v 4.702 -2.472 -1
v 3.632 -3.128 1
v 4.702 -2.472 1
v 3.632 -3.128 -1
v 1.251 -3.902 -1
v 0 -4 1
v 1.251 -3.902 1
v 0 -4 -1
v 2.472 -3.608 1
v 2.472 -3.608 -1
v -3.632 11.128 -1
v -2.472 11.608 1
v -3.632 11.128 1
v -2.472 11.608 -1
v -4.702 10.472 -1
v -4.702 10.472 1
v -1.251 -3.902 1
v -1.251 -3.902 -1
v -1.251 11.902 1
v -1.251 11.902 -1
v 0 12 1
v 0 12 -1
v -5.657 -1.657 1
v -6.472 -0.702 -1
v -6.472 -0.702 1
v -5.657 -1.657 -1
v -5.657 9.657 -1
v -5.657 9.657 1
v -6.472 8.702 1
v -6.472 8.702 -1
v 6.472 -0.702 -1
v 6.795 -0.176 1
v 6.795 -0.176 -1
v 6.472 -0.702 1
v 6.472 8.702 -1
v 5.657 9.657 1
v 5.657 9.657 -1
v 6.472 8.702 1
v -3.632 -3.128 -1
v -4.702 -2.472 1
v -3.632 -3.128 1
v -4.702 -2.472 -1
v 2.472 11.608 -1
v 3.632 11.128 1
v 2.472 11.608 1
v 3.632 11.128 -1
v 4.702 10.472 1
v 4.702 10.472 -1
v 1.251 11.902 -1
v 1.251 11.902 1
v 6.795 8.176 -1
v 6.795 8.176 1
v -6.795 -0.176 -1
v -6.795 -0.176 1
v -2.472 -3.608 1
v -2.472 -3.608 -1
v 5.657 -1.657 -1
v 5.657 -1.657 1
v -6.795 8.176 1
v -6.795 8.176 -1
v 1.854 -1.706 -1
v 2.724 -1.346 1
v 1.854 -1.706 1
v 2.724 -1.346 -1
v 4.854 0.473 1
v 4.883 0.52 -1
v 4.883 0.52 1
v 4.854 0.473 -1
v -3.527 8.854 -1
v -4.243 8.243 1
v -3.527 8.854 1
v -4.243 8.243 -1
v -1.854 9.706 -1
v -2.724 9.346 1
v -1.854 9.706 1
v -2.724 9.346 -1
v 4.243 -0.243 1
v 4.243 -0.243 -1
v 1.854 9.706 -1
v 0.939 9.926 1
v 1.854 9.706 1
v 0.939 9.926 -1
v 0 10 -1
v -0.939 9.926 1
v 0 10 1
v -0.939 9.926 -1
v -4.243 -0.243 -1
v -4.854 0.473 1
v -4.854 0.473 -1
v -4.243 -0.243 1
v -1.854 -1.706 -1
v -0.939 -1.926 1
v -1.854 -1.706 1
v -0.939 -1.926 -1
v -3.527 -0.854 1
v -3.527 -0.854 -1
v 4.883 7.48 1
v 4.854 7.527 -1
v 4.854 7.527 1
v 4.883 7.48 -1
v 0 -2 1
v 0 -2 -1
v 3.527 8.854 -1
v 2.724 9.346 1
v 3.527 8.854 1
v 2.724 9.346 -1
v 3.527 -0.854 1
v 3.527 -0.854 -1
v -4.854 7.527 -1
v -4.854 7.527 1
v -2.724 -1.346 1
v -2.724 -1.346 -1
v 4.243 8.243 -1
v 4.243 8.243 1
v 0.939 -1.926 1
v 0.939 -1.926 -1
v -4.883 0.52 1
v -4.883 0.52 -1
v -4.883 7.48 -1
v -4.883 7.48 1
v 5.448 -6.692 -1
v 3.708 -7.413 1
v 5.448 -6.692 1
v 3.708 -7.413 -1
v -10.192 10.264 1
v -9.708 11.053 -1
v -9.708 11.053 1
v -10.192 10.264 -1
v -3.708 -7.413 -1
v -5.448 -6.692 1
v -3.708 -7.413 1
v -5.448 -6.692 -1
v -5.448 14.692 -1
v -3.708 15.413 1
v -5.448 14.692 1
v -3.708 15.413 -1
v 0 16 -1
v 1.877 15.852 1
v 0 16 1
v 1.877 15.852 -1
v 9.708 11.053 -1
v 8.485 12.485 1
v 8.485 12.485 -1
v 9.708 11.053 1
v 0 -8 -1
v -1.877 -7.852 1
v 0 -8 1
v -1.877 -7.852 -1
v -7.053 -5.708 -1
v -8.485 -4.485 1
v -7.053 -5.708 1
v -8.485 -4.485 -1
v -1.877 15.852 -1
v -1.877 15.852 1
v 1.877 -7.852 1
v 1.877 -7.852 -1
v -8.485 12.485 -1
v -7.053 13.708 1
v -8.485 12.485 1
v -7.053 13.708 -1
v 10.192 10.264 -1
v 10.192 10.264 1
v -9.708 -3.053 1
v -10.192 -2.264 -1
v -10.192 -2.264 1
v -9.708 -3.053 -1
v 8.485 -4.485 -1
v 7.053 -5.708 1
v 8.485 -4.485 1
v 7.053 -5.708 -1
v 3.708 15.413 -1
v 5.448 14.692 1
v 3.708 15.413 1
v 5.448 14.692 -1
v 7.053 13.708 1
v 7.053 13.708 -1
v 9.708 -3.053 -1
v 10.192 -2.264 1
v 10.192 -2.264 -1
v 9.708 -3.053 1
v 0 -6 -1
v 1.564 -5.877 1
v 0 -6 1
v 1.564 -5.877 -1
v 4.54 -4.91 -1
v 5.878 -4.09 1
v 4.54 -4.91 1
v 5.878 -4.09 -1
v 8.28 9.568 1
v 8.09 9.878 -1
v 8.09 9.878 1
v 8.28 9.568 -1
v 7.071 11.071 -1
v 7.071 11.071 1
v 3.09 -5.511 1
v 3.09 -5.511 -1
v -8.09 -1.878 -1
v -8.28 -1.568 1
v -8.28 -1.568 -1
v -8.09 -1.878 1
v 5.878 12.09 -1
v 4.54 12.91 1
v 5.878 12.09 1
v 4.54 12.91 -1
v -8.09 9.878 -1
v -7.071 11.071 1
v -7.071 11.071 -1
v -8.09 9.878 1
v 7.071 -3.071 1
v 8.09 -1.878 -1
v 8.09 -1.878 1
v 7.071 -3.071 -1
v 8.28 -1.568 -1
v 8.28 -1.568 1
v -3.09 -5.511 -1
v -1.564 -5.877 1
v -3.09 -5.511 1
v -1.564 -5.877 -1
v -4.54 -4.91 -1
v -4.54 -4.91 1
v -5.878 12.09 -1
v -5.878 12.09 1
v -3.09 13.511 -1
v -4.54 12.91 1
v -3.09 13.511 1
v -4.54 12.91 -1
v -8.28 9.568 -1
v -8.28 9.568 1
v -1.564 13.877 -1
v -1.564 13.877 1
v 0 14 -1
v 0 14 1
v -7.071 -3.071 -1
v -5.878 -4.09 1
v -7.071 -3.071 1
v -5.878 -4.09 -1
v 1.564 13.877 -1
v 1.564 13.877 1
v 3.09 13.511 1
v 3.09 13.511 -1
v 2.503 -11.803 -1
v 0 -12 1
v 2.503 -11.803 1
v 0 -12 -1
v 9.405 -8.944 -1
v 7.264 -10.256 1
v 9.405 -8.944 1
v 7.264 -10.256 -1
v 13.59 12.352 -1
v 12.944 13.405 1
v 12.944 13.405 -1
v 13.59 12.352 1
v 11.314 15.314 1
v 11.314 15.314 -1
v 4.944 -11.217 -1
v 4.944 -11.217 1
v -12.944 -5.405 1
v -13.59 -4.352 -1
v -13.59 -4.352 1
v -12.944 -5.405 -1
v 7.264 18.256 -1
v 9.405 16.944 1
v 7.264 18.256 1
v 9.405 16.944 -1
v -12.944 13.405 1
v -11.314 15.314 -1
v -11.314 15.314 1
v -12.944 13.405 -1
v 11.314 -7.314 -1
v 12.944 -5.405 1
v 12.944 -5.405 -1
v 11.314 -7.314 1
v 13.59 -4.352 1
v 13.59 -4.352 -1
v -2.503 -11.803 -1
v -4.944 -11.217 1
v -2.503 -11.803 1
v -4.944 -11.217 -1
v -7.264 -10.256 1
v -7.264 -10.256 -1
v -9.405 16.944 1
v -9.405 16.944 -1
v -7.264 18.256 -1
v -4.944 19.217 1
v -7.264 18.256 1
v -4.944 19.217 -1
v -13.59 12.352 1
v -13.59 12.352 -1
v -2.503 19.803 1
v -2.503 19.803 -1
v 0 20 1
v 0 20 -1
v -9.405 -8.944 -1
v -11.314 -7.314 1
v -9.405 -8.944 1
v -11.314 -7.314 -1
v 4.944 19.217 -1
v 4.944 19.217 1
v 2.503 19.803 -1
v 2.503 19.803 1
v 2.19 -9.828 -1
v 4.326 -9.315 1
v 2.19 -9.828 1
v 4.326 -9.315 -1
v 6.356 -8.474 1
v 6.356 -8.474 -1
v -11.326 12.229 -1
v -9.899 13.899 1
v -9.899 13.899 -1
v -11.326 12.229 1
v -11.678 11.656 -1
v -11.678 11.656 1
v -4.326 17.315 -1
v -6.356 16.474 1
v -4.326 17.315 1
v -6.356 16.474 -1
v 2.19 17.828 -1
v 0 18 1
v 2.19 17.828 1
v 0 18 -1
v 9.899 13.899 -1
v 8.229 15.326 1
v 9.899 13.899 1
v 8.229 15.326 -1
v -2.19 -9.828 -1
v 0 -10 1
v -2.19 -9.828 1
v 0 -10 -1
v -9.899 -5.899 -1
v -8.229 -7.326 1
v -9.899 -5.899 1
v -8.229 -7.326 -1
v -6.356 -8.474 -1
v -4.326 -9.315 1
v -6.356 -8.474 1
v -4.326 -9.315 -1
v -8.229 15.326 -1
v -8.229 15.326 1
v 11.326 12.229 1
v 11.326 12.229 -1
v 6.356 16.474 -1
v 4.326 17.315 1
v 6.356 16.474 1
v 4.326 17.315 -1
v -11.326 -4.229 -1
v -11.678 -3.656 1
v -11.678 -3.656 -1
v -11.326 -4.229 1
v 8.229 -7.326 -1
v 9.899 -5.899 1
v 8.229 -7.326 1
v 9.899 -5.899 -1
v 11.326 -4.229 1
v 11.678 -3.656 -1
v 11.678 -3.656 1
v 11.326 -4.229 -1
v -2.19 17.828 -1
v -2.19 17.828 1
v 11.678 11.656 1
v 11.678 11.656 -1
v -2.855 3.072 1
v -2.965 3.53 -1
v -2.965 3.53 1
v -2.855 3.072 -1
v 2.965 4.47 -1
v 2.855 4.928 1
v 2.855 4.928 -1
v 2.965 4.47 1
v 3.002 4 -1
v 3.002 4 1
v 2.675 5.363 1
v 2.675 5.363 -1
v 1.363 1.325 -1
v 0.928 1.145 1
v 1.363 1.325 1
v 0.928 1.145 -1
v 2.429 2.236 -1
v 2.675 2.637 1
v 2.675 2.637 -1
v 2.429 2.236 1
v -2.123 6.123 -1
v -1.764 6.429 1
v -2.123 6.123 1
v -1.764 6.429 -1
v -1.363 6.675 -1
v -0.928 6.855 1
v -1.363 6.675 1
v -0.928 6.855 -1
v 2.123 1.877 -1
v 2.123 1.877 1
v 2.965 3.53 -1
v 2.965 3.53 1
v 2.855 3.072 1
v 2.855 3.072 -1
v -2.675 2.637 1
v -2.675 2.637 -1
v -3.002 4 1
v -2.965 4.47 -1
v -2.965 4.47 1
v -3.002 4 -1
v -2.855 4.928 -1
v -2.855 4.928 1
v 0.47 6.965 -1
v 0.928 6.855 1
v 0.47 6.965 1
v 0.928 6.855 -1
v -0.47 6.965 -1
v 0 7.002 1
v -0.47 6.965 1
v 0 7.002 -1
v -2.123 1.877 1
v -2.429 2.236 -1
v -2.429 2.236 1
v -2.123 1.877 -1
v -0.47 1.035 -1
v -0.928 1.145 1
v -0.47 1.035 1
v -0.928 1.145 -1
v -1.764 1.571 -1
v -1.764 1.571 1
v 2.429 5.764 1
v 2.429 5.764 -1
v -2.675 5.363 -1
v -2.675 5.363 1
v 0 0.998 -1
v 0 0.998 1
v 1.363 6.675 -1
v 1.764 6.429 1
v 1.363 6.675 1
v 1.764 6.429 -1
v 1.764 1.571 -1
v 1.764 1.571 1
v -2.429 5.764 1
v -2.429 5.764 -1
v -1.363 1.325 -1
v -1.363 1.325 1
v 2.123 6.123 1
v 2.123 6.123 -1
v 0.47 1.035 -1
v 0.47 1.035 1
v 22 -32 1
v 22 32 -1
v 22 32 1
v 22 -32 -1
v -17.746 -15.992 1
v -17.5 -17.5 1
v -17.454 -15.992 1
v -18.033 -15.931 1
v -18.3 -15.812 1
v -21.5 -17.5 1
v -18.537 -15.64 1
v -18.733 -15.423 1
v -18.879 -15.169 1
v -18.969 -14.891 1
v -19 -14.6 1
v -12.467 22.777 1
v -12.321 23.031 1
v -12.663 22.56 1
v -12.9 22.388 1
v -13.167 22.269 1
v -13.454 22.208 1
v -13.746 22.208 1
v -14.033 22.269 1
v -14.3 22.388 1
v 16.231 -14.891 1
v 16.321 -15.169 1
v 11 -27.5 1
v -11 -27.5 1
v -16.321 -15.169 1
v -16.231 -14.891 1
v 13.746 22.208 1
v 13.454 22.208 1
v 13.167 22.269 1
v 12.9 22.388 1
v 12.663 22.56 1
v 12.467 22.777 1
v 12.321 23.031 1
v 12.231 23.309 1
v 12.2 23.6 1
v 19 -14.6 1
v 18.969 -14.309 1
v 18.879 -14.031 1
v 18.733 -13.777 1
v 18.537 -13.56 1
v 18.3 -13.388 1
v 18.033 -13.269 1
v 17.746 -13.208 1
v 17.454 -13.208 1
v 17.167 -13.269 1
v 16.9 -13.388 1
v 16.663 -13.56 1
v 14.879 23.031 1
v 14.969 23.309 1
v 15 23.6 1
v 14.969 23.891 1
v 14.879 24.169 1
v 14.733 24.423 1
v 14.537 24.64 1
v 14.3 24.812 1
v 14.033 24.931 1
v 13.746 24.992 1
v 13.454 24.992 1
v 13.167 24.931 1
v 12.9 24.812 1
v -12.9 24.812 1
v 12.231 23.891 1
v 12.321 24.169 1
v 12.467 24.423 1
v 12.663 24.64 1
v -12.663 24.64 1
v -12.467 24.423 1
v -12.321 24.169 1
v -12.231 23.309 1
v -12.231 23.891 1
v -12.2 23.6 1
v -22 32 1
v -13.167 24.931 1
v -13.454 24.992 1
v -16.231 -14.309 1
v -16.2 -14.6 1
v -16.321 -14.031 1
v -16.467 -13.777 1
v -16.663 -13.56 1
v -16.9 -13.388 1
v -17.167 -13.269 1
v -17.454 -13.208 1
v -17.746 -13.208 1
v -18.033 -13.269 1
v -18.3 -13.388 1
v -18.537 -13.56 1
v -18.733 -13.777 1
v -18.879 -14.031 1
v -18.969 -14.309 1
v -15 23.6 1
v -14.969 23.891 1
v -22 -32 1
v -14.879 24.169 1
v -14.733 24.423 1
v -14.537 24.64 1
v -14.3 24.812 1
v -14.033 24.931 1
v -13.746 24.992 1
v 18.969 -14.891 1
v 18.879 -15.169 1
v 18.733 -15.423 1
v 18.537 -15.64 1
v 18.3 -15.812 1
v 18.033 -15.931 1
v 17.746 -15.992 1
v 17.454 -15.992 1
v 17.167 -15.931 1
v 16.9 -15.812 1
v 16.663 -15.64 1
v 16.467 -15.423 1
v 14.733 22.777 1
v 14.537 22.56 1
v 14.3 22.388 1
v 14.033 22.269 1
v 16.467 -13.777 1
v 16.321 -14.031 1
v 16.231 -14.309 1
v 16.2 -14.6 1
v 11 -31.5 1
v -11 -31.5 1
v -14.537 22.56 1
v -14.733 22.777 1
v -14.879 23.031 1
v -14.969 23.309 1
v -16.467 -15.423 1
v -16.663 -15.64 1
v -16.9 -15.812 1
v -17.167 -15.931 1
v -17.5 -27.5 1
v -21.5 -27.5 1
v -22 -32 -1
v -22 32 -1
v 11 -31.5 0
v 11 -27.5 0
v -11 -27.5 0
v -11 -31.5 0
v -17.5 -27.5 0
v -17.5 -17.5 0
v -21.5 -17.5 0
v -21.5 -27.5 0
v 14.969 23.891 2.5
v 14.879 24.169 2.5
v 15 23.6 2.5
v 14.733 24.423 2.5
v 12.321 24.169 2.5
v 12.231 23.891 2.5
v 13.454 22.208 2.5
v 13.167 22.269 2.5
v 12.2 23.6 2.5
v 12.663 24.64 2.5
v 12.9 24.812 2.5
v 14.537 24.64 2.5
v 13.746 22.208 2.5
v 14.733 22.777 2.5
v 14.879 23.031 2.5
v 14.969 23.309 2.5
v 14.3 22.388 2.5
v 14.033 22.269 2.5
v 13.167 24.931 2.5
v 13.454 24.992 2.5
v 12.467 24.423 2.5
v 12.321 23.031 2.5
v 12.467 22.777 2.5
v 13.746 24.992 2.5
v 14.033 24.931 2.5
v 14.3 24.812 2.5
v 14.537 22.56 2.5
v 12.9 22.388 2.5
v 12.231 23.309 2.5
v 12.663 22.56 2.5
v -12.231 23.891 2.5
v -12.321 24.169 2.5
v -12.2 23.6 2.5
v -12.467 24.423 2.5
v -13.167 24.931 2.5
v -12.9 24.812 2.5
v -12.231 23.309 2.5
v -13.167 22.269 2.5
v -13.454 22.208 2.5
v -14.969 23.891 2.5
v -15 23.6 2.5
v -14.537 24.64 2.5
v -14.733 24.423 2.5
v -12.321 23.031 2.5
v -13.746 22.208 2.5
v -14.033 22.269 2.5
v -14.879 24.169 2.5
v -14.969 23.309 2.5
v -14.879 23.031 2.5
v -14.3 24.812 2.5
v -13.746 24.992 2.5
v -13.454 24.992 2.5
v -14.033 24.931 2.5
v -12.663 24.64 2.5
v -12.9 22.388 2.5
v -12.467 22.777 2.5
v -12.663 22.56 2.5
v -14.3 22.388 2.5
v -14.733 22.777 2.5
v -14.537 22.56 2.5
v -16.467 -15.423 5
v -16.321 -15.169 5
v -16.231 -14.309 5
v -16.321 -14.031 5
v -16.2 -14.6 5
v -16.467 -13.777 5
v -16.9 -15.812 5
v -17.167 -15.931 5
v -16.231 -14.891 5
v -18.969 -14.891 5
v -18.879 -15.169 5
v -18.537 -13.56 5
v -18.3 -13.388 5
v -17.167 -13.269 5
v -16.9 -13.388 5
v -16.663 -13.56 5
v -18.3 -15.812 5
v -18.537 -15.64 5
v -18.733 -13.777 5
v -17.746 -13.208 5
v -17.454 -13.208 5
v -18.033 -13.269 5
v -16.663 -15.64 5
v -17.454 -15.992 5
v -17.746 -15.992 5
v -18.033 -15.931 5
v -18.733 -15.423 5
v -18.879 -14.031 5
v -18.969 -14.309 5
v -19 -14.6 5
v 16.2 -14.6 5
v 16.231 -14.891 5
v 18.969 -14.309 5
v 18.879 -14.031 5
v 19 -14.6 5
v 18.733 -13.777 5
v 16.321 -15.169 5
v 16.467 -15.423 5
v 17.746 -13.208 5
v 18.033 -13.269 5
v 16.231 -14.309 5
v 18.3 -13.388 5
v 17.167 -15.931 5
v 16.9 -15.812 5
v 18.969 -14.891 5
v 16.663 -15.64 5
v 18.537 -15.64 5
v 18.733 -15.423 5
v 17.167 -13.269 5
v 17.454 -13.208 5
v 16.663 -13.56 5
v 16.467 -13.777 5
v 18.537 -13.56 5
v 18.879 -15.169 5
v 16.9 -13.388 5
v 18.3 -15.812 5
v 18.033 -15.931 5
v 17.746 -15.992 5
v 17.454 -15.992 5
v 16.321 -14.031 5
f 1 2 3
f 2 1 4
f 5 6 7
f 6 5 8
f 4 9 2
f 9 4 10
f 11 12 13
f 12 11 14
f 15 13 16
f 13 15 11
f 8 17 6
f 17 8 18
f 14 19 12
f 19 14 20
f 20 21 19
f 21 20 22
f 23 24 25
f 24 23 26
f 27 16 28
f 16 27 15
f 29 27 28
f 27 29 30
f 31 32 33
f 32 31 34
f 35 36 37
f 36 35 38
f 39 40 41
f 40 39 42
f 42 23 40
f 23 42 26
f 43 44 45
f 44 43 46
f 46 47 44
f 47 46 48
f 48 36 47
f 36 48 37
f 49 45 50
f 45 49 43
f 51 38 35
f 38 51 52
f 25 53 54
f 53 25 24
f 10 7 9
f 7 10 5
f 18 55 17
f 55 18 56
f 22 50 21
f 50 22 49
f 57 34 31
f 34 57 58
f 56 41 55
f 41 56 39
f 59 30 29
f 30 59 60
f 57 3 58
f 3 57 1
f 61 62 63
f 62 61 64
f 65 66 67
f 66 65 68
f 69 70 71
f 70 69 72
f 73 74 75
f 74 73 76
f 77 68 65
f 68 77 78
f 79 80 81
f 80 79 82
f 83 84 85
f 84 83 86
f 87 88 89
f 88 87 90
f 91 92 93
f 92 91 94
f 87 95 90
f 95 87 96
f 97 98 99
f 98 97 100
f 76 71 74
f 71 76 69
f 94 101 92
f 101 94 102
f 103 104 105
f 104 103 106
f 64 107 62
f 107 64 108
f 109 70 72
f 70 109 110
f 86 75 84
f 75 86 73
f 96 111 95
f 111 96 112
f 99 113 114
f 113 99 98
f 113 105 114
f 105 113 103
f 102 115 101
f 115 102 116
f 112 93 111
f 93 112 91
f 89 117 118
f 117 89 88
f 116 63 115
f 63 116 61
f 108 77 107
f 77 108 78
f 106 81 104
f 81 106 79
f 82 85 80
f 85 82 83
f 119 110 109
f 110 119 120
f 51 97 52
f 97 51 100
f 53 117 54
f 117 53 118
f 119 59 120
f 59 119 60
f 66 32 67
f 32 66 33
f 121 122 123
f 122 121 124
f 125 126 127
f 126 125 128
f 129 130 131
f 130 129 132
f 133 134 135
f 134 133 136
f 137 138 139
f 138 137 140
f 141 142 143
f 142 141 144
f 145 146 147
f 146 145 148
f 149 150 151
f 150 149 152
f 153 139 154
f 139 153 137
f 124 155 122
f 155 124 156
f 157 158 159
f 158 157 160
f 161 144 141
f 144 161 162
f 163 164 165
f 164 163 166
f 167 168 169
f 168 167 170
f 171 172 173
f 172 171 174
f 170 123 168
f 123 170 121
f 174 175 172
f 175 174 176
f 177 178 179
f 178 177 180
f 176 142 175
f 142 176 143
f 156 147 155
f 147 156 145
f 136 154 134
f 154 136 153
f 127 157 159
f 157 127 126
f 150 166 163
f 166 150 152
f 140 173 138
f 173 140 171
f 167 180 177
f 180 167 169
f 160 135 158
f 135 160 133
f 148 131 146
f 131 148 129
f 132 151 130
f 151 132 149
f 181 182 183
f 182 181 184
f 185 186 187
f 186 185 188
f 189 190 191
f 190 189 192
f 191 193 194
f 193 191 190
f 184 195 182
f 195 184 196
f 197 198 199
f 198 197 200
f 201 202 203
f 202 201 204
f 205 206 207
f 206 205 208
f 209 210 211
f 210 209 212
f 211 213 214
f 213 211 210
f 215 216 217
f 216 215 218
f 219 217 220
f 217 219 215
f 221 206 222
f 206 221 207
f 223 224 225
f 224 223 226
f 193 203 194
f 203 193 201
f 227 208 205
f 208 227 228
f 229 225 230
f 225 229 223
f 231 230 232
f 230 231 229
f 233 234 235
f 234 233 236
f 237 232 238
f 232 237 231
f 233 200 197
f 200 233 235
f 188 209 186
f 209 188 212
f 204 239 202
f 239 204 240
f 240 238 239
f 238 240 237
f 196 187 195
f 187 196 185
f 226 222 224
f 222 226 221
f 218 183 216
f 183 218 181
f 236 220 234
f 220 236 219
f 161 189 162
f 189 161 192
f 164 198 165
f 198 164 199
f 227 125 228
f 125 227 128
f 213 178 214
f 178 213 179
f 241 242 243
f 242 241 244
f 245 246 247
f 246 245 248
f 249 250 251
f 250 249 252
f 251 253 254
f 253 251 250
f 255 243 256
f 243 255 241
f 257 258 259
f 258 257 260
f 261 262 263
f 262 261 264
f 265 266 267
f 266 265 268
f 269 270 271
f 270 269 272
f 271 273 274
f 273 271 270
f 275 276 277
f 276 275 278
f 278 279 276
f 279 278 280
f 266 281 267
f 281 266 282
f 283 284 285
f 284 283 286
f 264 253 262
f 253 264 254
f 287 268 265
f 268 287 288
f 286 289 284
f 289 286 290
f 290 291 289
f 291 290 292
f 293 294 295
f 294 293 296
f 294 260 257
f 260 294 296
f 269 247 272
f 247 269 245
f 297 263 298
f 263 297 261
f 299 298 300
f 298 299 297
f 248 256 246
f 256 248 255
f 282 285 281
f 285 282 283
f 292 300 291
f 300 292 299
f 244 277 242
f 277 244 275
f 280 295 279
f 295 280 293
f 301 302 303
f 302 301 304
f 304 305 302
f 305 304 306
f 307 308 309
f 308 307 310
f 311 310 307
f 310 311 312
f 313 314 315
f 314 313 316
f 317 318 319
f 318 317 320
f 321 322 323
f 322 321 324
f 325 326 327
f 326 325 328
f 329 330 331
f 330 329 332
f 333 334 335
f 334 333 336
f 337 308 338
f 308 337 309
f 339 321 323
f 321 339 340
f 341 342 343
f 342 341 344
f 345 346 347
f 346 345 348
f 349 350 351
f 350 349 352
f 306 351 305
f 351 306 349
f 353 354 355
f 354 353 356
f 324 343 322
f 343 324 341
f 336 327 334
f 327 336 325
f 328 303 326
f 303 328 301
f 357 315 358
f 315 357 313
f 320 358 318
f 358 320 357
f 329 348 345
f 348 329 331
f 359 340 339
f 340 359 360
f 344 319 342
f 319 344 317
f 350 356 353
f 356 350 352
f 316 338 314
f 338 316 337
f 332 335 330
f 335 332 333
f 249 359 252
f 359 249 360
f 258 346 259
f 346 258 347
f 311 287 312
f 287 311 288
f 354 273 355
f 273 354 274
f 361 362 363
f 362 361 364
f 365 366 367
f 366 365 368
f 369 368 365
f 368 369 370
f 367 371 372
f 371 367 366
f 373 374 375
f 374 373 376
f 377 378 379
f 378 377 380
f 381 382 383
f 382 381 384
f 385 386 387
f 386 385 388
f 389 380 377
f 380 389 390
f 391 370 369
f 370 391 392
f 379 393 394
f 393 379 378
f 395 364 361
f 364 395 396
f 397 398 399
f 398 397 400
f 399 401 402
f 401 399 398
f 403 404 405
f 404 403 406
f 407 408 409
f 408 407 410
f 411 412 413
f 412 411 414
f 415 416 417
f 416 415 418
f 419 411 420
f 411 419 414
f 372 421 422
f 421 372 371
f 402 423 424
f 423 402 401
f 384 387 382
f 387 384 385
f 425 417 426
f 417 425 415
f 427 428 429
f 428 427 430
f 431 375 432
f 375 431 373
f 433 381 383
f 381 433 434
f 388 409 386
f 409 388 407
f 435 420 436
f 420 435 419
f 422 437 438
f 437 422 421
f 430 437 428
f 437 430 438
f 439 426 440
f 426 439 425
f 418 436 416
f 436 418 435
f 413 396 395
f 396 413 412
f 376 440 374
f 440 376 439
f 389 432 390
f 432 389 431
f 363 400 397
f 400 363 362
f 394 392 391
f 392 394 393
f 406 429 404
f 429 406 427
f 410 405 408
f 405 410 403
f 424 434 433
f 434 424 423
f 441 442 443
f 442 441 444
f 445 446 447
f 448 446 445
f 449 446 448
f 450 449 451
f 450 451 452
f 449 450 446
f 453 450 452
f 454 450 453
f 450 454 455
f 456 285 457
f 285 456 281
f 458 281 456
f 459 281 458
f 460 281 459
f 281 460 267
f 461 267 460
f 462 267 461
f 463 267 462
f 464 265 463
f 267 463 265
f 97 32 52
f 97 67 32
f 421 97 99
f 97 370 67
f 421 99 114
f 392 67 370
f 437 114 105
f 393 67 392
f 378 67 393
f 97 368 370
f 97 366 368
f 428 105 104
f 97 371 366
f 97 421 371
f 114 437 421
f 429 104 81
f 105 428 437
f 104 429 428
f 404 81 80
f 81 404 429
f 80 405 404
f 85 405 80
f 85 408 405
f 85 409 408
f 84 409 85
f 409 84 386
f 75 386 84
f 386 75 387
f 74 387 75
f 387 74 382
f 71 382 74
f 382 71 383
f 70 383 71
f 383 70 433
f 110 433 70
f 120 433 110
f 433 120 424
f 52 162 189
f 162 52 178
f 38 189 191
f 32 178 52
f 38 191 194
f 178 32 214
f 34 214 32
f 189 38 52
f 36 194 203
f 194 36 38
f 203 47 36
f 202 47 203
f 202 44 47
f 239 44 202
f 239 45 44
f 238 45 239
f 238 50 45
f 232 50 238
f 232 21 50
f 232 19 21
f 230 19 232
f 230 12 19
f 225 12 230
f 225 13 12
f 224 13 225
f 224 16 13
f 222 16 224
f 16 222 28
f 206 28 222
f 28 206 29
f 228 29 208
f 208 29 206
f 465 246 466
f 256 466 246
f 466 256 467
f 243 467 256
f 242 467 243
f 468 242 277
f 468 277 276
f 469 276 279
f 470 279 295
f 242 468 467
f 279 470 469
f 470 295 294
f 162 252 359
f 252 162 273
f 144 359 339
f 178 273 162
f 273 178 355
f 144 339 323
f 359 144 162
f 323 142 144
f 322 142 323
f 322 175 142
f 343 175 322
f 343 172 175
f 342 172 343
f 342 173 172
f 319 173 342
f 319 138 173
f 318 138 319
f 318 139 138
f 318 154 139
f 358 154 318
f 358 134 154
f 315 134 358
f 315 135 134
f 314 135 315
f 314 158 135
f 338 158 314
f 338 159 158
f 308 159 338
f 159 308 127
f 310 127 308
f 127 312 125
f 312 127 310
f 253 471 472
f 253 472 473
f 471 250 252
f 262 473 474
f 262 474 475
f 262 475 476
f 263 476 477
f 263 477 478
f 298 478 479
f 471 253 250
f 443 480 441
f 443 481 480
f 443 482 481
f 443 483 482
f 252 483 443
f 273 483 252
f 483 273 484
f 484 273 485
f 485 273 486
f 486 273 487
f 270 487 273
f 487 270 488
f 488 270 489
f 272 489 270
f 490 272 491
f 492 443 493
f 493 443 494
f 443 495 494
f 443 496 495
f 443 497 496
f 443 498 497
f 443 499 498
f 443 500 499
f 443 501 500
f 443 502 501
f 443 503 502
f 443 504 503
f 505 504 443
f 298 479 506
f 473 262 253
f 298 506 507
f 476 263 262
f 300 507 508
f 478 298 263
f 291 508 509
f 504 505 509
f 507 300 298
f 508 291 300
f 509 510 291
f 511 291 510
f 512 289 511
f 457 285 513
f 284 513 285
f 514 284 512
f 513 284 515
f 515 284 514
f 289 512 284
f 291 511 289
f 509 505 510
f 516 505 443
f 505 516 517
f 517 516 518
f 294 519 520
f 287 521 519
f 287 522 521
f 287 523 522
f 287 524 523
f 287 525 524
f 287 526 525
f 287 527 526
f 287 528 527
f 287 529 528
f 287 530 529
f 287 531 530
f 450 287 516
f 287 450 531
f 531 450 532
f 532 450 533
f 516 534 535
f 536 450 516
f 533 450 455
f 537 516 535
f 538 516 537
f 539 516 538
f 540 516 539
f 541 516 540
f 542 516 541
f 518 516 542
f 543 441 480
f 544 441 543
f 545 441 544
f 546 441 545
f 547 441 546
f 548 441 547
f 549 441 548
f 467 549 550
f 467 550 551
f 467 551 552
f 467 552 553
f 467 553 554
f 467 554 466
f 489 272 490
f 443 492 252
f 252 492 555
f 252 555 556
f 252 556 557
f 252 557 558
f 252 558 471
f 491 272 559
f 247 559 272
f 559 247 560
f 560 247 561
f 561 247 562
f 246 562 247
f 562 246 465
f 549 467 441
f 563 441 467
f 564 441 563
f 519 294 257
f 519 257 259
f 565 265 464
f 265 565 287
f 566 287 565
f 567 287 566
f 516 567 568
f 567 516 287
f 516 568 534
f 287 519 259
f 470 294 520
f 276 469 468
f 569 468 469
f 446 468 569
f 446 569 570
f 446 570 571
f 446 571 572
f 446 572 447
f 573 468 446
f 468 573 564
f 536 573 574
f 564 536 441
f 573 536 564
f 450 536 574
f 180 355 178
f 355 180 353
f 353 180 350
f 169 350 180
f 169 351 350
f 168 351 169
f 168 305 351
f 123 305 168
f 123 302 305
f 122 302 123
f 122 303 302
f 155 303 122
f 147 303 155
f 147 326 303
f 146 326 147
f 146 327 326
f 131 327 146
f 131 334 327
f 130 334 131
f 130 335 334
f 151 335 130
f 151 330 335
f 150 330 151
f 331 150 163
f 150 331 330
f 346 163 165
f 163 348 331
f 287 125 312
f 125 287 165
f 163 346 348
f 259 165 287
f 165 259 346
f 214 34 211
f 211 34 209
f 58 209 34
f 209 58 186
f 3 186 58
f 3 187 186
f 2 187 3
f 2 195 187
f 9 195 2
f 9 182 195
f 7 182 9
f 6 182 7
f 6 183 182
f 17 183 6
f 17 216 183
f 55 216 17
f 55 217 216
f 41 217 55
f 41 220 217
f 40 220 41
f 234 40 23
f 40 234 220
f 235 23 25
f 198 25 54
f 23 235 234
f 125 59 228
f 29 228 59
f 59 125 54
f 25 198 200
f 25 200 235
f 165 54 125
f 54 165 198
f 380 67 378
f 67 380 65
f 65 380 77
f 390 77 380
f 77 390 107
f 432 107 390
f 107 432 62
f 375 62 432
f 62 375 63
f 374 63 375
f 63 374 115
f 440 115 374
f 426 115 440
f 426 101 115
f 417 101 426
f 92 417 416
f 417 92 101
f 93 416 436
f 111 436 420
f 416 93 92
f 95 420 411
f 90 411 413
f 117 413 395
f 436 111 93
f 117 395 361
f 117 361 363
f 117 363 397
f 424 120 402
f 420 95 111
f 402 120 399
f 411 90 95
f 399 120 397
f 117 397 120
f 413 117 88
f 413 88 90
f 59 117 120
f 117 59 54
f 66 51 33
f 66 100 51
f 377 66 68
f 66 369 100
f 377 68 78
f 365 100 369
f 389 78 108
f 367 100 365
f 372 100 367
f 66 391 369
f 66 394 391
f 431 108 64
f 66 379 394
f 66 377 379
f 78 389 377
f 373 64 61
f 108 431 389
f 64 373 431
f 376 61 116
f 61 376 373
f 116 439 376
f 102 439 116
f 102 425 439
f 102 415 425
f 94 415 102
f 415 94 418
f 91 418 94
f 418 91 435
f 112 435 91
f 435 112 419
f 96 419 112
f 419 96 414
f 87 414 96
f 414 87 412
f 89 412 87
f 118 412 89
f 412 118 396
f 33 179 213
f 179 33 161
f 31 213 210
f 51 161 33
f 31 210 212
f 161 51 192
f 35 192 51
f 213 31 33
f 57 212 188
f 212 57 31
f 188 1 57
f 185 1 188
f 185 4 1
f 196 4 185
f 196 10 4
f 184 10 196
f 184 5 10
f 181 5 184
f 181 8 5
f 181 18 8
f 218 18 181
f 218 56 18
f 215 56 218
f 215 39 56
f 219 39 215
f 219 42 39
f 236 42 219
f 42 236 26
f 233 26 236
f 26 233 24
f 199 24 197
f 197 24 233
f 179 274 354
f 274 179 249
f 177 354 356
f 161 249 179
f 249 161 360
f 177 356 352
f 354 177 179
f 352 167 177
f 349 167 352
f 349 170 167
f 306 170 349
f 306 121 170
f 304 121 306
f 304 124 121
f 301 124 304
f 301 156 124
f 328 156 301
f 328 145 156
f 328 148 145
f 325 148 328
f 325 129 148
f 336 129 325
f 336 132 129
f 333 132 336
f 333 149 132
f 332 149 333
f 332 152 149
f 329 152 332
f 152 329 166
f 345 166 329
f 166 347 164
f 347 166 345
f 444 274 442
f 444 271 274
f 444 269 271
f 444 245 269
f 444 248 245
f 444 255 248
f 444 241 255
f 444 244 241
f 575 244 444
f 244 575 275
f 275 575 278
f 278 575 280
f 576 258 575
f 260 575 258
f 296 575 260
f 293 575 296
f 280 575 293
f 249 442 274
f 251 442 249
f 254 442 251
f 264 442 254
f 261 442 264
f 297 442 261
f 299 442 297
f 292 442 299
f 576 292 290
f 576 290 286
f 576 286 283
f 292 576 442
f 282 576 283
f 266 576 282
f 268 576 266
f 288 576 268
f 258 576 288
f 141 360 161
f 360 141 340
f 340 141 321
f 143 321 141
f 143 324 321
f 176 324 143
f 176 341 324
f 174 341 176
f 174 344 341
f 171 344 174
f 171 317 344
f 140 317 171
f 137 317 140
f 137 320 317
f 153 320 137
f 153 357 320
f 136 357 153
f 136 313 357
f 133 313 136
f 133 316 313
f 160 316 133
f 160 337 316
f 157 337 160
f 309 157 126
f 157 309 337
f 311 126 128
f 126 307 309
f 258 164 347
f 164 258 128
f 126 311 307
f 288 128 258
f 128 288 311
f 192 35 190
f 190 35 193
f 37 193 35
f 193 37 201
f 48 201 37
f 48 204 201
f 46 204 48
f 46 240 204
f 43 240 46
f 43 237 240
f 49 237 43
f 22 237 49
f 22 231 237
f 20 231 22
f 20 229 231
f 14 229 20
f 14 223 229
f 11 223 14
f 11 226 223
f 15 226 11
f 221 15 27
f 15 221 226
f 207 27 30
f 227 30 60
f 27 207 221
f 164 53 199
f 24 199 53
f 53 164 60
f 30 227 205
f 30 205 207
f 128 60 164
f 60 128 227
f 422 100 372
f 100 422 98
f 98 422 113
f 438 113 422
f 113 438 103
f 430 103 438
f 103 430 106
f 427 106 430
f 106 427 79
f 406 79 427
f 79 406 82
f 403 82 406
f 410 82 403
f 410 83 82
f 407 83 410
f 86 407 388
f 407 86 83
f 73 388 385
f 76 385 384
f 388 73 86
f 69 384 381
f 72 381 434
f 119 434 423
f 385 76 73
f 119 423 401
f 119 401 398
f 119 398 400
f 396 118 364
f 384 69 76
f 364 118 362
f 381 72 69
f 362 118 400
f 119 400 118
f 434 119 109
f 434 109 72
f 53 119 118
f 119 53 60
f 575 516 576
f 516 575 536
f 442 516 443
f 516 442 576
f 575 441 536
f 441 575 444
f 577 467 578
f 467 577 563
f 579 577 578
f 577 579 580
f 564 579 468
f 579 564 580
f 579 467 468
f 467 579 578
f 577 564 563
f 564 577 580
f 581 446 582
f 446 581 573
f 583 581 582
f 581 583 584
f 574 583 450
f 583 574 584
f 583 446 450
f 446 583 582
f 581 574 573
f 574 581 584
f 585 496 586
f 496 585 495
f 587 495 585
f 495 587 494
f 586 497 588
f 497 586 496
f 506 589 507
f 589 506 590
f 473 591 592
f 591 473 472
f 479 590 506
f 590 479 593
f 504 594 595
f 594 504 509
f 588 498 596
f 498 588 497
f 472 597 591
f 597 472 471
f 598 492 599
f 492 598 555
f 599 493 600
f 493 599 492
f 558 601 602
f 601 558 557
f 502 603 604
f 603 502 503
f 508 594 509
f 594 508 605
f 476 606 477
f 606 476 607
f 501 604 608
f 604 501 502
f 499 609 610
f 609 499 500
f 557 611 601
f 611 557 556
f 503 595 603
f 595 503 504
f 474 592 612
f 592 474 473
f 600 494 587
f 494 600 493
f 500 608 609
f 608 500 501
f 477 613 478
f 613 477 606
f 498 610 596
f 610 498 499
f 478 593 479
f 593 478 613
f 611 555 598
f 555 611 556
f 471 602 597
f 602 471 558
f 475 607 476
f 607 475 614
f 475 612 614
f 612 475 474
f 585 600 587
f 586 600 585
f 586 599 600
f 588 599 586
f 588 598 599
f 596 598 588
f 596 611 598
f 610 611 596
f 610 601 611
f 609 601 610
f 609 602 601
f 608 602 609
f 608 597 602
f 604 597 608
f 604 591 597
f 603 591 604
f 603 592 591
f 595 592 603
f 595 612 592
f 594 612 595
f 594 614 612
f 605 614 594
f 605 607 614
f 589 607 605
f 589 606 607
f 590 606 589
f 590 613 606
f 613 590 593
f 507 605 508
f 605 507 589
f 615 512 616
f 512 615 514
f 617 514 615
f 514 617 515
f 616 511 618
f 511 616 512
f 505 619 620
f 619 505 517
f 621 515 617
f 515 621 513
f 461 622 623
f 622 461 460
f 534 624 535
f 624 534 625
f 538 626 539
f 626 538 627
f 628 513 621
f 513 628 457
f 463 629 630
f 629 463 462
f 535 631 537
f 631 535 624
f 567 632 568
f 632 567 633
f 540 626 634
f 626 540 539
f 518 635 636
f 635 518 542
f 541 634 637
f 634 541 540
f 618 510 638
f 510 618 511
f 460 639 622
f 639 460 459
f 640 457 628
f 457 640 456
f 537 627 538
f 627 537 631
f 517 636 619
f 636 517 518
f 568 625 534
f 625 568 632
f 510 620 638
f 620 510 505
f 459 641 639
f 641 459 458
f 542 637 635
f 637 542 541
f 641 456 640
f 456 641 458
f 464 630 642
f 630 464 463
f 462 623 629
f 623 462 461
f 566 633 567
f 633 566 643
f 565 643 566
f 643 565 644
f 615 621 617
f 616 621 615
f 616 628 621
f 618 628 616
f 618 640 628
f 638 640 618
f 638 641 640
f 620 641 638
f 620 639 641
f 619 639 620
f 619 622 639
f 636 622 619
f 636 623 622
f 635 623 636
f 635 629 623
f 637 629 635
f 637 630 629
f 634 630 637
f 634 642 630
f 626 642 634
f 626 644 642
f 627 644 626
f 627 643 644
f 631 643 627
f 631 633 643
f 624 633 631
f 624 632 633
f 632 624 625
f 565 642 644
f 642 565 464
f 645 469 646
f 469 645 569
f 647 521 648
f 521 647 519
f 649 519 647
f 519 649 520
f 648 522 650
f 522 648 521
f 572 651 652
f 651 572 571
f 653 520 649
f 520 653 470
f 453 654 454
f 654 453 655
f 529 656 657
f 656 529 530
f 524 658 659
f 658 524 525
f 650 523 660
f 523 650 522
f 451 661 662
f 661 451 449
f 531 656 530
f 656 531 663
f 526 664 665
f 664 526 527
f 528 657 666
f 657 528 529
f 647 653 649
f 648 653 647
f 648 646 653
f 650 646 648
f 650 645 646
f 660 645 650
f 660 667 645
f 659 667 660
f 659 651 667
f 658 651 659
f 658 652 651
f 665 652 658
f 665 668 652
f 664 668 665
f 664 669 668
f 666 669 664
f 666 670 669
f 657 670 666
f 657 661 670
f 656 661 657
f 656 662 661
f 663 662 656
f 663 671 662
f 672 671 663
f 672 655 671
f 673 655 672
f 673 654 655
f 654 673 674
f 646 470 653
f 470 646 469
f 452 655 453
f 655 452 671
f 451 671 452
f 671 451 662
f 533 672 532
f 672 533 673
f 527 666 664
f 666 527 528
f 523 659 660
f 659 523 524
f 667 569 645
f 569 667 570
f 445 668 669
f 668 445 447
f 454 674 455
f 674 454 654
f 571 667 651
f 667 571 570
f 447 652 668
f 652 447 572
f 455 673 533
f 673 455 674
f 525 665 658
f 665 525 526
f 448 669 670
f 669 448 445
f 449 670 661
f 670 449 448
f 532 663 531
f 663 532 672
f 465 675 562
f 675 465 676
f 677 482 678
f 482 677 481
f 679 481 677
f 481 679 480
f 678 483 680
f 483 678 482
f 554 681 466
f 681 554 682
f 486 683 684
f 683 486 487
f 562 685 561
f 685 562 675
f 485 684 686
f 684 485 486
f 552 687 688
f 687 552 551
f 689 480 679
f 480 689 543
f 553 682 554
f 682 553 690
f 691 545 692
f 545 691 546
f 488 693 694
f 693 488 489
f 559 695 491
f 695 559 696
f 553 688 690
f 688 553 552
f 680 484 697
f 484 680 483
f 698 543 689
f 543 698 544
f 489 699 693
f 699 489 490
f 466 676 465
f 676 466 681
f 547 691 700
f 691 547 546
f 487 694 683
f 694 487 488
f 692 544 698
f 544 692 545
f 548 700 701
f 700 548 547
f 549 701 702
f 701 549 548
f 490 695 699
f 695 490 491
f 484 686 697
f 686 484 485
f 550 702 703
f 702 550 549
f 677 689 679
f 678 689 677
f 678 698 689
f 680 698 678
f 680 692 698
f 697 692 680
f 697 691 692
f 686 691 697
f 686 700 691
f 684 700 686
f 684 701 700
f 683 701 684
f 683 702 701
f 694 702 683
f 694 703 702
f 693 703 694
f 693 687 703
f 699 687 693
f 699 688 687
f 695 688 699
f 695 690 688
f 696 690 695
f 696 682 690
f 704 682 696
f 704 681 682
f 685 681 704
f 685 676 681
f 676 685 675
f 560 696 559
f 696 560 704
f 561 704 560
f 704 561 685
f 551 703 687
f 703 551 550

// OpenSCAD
// file: NFCLogo.scad
/* NFC Like Logo */
/* Loic - August 2017 */

nfc_logo(16,5);

module nfc_logo(diam,height)
{
    cylinder(height,3,3,$fn=40);
    waves2(height,diam/2);
    waves2(height,diam*0.75);
    waves2(height,diam);
}

module waves2(height,ext_diam)
{
    //height = 2;
    //ext_diam = 10;
    
    faces = 40;
    int_diam = ext_diam - 2;
    rect_len = 2.4 * ext_diam;
    rect_height = 3 * height;
    
    difference()
    {
        difference()
        {
            cylinder(height,ext_diam,ext_diam,$fn=faces);
            translate([0,0,-1])
              cylinder(height+2,int_diam,int_diam,$fn=faces);
        }
        
        cube([rect_len,ext_diam*0.4,rect_height],true);
        
        rotate(20)
        cube([rect_len,ext_diam*0.4,rect_height],true);
        rotate(-20)
        cube([rect_len,ext_diam*0.4,rect_height],true);
    }
}
// main file
/* Loic - August 2017 */

use <NFCLogo.scad>

pin_diam = 1.4;
pin_height = 2.5;

difference()
{
    cube([44,64,2],true);

   
    translate([0,4,-2])
        nfc_logo(16,20);
    
   translate([0,-29.5,+1])
        cube([22,4,2],true);

       translate([-19.5,-22.5,+1])
        cube([4,10,2],true);

}

translate([22-pin_diam-7,32-pin_diam-7,0])
    cylinder(pin_height,pin_diam,pin_diam,$fn=30);

translate([-22+pin_diam+7,32-pin_diam-7,0])
    cylinder(pin_height,pin_diam,pin_diam,$fn=30);

translate([-22+pin_diam+3,-32+pin_diam+16,0])
    cylinder(pin_height*2,pin_diam,pin_diam,$fn=30);

translate([22-pin_diam-3,-32+pin_diam+16,0])
    cylinder(pin_height*2,pin_diam,pin_diam,$fn=30);
